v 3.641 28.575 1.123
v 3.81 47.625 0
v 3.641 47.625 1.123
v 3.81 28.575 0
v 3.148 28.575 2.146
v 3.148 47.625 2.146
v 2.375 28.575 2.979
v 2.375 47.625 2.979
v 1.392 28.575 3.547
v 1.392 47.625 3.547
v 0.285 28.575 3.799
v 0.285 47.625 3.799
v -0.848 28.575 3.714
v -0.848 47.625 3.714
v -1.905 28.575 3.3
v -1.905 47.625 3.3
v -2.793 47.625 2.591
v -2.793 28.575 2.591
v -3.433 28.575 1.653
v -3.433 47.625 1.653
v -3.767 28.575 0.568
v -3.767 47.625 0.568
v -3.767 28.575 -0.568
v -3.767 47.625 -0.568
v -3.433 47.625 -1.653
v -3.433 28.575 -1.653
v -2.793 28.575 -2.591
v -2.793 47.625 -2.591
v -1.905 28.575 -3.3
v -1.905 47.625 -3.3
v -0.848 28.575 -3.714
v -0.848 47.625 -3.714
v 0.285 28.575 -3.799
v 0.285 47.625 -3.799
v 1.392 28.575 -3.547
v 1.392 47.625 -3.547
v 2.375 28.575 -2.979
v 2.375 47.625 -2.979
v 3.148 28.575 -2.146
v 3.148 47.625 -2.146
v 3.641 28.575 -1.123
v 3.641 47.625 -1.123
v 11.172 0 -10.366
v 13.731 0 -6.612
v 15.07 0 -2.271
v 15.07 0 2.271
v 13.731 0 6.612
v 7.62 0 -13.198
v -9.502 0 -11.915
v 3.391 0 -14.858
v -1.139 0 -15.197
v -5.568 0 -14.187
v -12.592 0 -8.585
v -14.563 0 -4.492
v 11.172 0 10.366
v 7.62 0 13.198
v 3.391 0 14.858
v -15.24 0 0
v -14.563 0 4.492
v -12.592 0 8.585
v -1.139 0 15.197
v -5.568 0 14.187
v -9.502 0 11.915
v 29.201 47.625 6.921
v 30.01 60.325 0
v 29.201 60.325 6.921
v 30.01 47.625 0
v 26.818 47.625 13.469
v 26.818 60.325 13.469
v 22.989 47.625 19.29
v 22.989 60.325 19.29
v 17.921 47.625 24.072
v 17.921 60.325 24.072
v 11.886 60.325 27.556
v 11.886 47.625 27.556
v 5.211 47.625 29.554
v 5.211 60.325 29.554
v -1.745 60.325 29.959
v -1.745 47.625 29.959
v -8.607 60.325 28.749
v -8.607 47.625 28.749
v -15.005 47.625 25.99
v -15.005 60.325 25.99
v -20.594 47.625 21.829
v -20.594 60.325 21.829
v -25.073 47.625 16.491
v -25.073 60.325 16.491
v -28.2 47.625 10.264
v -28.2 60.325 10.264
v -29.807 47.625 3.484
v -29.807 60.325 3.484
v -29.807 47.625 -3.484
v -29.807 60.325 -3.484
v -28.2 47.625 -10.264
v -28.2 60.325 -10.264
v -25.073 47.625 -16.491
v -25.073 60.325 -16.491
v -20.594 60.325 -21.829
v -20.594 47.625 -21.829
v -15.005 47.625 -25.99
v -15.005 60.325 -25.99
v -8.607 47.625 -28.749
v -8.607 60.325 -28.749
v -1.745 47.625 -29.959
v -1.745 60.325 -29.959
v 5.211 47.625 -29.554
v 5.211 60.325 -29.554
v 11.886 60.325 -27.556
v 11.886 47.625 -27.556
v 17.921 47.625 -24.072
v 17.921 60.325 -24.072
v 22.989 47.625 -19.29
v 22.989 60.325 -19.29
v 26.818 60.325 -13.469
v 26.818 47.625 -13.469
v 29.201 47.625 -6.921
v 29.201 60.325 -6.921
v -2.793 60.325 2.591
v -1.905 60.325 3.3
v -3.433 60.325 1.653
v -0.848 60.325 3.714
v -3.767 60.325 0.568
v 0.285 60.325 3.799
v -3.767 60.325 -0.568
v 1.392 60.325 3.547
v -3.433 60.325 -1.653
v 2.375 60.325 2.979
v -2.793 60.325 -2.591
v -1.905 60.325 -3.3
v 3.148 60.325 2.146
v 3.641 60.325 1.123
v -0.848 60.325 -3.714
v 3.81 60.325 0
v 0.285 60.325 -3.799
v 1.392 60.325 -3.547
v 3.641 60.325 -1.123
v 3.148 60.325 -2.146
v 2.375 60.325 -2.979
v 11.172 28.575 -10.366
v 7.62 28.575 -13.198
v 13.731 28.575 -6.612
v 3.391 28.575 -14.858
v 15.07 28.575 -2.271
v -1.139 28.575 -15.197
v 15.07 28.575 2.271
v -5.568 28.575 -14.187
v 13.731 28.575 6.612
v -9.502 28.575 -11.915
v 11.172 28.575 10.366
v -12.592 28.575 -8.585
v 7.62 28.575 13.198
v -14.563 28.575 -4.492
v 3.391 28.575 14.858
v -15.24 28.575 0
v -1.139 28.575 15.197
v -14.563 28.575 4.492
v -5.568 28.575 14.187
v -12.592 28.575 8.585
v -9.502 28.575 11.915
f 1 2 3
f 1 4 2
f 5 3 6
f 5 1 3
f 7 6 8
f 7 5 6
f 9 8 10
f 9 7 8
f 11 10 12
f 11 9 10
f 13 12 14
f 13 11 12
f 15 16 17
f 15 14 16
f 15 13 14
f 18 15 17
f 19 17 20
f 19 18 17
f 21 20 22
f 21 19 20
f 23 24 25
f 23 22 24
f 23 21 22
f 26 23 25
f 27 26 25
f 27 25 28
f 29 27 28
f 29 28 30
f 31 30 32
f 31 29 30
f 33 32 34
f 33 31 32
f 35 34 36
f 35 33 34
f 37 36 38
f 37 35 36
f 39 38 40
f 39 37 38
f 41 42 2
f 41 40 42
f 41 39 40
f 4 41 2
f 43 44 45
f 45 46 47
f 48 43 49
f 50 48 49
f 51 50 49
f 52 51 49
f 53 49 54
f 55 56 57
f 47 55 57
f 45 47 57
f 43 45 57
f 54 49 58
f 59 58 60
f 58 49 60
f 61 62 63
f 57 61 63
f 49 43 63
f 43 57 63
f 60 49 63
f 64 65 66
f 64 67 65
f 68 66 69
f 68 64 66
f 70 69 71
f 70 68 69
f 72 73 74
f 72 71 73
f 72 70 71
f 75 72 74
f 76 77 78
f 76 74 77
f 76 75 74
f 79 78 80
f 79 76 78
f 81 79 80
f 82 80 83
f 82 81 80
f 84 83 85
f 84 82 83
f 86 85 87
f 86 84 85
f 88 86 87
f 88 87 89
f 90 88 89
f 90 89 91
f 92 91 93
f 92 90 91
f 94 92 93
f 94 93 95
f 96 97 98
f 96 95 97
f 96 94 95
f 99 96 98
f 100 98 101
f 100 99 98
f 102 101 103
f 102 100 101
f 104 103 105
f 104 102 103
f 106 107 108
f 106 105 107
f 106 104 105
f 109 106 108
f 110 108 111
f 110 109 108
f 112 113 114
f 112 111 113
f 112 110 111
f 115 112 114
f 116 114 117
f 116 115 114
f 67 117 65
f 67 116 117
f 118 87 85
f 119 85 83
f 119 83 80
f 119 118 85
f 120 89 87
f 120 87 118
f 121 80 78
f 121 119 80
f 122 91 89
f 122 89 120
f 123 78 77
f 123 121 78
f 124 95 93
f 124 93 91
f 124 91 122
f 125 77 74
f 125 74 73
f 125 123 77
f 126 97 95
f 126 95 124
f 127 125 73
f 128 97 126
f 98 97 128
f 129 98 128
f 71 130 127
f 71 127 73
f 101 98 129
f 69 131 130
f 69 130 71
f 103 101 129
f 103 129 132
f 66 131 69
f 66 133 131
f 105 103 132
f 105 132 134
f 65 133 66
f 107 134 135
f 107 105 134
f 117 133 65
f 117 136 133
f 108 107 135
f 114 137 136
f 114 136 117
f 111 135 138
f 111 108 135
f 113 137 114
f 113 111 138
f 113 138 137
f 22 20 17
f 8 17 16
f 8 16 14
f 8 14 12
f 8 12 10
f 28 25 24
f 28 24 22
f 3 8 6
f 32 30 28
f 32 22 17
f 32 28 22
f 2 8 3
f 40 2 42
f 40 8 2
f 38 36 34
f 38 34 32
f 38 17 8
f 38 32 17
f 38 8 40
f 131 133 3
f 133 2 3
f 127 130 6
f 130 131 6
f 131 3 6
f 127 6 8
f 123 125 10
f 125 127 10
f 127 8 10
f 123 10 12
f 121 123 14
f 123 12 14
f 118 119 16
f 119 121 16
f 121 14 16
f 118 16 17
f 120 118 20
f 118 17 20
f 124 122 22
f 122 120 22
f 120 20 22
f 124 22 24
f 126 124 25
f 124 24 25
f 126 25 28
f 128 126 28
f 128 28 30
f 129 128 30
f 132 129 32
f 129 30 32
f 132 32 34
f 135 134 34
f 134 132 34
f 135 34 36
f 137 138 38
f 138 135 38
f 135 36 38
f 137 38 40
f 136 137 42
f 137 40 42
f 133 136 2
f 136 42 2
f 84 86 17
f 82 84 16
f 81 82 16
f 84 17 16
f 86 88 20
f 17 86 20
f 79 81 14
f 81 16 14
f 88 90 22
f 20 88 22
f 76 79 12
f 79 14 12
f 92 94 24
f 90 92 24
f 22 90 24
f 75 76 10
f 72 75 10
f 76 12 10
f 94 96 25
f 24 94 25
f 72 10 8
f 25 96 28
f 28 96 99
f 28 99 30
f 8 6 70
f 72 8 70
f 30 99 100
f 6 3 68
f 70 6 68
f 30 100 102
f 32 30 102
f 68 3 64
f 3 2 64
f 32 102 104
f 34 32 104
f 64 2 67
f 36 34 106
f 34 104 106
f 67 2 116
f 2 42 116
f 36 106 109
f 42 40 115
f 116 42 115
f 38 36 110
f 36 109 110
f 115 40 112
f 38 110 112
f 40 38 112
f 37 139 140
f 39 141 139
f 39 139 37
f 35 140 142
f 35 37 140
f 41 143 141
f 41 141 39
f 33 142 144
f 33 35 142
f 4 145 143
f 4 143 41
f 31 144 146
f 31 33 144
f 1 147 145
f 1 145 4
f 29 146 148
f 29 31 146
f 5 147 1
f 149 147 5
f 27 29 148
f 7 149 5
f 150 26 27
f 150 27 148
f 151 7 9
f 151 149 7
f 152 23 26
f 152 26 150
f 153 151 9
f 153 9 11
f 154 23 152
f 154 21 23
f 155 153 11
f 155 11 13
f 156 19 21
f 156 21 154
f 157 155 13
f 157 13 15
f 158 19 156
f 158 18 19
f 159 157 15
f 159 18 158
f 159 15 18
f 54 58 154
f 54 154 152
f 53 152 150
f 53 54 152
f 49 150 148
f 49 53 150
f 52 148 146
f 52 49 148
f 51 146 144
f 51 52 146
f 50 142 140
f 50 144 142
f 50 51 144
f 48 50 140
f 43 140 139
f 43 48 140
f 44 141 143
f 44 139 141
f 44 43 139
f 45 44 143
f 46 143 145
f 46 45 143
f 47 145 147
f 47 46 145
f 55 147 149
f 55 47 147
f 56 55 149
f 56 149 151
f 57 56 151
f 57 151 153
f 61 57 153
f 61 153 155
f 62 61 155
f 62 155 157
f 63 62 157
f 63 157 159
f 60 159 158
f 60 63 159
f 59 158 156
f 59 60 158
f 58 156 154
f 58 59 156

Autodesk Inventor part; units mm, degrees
ref_plane "YZ Plane" through (0, 0, 0) normal (1, 0, 0) x (0, 1, 0)
ref_plane "XZ Plane" through (0, 0, 0) normal (0, 1, 0) x (-1, 0, 0)
ref_plane "XY Plane" through (0, 0, 0) normal (0, 0, 1) x (1, 0, 0)
sketch "Sketch1" plane through (0, 0, 0) normal (0, 1, 0) x (-1, 0, 0)
  circle A0 centre (0, 0) radius 15.24
  dimension "d0" = 30.48
extrude "Extrusion1" add sketch "Sketch1" along normal blind 28.575
sketch "Sketch2" plane through (0, 28.575, 0) normal (0, 1, 0) x (1, 0, 0)
  circle A0 centre (0, 0) radius 3.81
  dimension "d3" = 7.62
extrude "Extrusion2" add sketch "Sketch2" along normal blind 19.05
sketch "Sketch3" plane through (0, 47.625, 0) normal (0, 1, 0) x (1, 0, 0)
  circle A0 centre (0, 0) radius 3.81 projected
  circle A1 centre (0, 0) radius 30.0101
  dimension "d6" = 60.0202
extrude "Extrusion3" add sketch "Sketch3" along normal blind 12.7
properties part number "motor"
